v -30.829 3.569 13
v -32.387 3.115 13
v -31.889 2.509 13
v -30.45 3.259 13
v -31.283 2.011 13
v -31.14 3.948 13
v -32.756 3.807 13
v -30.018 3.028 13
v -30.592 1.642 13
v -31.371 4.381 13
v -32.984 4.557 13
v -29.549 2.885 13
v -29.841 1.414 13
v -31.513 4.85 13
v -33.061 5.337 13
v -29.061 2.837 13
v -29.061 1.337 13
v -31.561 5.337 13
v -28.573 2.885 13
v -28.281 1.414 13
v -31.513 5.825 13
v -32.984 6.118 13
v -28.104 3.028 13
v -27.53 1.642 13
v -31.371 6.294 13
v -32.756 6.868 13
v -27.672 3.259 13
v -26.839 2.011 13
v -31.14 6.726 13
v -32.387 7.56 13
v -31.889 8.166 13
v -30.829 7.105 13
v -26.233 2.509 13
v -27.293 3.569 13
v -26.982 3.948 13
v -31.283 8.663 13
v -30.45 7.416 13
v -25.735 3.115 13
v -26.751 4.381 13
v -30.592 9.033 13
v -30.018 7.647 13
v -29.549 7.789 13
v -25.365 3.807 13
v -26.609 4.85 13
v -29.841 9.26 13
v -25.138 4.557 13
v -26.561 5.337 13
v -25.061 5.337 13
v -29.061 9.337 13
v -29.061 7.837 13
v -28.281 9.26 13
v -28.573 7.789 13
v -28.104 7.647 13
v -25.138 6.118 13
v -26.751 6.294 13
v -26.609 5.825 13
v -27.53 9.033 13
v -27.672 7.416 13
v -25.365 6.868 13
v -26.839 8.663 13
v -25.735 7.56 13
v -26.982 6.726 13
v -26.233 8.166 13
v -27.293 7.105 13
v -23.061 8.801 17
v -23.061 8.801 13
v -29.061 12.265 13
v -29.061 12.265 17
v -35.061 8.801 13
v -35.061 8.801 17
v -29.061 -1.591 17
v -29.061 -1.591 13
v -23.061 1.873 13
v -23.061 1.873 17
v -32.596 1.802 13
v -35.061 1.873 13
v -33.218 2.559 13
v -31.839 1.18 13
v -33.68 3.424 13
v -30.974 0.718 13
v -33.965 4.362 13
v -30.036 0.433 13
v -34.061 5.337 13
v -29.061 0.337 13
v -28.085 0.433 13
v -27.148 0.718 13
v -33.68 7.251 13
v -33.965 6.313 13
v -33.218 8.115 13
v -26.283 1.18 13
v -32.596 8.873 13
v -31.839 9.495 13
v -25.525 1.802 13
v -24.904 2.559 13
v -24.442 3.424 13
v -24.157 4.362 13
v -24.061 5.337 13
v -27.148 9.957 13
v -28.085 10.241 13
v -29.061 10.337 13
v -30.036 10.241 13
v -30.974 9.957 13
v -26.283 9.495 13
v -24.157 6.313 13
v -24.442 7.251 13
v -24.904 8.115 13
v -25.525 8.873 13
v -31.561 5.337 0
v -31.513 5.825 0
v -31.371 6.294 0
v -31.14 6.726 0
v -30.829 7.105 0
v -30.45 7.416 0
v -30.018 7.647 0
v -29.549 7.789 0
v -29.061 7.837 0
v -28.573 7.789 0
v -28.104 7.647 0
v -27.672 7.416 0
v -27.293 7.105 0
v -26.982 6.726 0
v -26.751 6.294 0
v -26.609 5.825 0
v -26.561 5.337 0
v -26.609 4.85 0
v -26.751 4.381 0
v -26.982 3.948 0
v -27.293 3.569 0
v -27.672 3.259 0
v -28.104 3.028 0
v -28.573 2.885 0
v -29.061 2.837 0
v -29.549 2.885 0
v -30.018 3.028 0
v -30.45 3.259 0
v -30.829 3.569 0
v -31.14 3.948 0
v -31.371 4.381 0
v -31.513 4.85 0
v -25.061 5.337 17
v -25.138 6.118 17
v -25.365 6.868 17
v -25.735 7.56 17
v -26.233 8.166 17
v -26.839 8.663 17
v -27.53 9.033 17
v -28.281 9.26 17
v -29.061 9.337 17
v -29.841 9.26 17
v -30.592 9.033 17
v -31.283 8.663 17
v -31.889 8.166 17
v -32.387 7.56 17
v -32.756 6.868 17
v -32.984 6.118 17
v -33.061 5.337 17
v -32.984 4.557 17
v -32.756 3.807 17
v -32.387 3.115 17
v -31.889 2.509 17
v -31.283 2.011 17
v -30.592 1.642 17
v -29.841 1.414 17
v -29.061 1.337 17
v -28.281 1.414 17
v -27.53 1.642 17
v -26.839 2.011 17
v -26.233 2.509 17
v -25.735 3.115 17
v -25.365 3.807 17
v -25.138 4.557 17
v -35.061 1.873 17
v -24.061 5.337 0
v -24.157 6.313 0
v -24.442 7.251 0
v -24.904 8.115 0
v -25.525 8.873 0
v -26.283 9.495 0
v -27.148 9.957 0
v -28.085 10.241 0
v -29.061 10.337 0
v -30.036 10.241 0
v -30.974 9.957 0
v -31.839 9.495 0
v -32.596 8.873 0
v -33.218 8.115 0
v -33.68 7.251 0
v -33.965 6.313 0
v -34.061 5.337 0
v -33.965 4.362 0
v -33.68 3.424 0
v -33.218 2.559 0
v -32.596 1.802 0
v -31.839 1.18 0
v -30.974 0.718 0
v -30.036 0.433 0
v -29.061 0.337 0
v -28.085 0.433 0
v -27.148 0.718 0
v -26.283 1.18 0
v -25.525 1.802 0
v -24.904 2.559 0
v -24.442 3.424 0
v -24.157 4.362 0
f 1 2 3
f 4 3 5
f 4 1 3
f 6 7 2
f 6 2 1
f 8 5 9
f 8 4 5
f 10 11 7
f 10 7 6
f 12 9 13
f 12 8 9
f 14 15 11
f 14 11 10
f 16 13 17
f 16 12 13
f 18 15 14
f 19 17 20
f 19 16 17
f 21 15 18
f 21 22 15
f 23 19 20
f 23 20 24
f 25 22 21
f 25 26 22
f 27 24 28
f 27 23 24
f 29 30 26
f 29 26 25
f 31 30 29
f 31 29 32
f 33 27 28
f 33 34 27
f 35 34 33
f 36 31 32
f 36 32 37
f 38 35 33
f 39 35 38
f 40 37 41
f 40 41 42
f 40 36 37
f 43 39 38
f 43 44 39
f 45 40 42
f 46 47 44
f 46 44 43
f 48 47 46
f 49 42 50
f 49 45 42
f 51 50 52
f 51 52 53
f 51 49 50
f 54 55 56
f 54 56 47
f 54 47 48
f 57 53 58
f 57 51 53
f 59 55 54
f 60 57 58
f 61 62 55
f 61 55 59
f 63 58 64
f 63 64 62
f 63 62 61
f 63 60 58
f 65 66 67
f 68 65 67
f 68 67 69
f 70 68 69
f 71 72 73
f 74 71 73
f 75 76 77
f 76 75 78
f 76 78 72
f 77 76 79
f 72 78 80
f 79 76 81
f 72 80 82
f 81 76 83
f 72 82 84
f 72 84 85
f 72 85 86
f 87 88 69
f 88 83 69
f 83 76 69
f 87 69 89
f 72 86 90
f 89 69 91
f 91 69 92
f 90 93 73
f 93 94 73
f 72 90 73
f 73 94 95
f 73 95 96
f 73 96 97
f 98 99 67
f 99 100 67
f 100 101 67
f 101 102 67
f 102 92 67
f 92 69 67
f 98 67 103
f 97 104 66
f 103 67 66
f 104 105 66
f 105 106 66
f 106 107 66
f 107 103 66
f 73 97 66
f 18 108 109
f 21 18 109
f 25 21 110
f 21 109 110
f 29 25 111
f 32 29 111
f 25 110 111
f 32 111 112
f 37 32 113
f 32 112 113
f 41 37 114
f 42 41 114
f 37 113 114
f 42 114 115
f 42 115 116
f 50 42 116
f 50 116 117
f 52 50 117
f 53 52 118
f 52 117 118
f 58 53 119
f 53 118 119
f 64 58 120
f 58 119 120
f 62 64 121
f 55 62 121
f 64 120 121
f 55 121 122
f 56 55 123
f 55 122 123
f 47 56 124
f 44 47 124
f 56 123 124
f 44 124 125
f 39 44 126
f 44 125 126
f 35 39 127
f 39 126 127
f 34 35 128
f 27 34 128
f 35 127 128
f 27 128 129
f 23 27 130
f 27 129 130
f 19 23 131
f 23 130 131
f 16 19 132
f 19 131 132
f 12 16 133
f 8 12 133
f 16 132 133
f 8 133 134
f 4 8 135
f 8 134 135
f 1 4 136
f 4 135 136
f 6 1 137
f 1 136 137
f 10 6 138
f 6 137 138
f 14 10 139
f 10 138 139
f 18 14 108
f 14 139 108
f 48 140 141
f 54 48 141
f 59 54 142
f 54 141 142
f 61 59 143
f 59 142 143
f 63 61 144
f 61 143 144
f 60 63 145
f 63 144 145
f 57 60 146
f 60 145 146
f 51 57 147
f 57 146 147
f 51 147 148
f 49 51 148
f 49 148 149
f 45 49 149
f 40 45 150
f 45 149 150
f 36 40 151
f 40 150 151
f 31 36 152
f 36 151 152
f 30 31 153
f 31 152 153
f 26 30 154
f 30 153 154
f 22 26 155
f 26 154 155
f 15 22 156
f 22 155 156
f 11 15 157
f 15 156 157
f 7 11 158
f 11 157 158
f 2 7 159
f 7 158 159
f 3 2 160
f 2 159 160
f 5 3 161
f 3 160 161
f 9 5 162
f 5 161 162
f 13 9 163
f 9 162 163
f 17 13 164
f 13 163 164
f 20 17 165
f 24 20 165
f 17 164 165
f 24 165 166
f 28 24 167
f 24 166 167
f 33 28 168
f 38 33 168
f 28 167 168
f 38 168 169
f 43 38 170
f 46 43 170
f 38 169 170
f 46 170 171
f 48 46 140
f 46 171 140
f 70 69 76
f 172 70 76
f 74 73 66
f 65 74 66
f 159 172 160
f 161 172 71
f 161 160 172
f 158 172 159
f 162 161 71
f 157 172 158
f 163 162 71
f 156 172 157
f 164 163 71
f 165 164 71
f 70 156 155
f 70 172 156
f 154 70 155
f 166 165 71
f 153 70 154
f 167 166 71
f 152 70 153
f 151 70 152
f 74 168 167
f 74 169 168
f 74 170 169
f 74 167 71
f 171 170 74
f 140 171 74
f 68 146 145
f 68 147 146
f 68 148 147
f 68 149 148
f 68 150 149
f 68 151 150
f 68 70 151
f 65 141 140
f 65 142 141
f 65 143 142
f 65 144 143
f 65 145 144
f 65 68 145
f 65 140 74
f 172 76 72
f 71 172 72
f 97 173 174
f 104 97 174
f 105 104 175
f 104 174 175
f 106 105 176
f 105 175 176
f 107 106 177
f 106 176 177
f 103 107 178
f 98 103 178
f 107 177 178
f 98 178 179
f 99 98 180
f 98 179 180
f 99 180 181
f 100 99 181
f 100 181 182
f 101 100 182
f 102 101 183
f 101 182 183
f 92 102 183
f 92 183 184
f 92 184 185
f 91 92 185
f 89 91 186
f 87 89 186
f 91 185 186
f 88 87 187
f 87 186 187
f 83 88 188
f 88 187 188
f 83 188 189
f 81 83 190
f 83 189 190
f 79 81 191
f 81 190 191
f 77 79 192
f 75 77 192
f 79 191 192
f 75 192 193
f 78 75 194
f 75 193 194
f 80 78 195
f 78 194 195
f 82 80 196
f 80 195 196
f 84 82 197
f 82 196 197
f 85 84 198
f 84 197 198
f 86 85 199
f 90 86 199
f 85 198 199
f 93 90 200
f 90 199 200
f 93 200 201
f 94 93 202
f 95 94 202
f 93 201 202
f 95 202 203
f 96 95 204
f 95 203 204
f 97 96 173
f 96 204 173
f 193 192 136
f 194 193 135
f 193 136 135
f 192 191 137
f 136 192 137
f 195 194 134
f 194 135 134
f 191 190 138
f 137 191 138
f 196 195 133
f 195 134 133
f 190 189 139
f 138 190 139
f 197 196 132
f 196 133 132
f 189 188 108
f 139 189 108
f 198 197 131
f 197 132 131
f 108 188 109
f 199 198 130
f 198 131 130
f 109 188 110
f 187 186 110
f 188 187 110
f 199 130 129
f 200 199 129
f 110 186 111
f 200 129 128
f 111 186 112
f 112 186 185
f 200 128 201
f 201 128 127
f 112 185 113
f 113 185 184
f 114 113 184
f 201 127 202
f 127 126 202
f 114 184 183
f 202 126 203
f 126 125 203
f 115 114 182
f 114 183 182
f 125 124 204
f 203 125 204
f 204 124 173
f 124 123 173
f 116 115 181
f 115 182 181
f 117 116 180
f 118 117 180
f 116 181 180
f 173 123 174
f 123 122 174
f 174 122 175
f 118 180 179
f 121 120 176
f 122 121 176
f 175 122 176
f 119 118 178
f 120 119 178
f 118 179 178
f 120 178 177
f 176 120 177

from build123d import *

# Parameters (mm, degrees)
SKETCH2_R           = 5
BOSS_EXTRUDE1_DEPTH = 13
BOSS_EXTRUDE2_DEPTH = 4
SKETCH4_R           = 2.5
CUT_EXTRUDE1_DEPTH  = 13
SKETCH5_R           = 4
CUT_EXTRUDE2_DEPTH  = 4


with BuildPart() as part:
    # Sketch2 → Boss-Extrude1 (new body)
    with BuildSketch(Plane.XY):
        with Locations((-29.060949788, 5.337240829)):
            Circle(SKETCH2_R)
    extrude(amount=BOSS_EXTRUDE1_DEPTH)

    # Sketch3 → Boss-Extrude2 (add)
    with BuildSketch(Plane.XY.offset(13)):
        Polygon((-29.060949788, -1.590962401), (-23.060949788, 1.873139214), (-23.060949788, 8.801342444), (-29.060949788, 12.26544406), (-35.060949788, 8.801342444), (-35.060949788, 1.873139214), align=None)
    extrude(amount=BOSS_EXTRUDE2_DEPTH)

    # Sketch4 → Cut-Extrude1 (cut)
    with BuildSketch(Plane(origin=(0, 0, 0), x_dir=(-1, 0, 0), z_dir=(0, 0, -1))):
        with Locations((29.060949788, 5.337240829)):
            Circle(SKETCH4_R)
    extrude(amount=-CUT_EXTRUDE1_DEPTH, mode=Mode.SUBTRACT)

    # Sketch5 → Cut-Extrude2 (cut)
    with BuildSketch(Plane.XY.offset(17)):
        with Locations((-29.060949788, 5.337240829)):
            Circle(SKETCH5_R)
    extrude(amount=-CUT_EXTRUDE2_DEPTH, mode=Mode.SUBTRACT)


solid = part.part
